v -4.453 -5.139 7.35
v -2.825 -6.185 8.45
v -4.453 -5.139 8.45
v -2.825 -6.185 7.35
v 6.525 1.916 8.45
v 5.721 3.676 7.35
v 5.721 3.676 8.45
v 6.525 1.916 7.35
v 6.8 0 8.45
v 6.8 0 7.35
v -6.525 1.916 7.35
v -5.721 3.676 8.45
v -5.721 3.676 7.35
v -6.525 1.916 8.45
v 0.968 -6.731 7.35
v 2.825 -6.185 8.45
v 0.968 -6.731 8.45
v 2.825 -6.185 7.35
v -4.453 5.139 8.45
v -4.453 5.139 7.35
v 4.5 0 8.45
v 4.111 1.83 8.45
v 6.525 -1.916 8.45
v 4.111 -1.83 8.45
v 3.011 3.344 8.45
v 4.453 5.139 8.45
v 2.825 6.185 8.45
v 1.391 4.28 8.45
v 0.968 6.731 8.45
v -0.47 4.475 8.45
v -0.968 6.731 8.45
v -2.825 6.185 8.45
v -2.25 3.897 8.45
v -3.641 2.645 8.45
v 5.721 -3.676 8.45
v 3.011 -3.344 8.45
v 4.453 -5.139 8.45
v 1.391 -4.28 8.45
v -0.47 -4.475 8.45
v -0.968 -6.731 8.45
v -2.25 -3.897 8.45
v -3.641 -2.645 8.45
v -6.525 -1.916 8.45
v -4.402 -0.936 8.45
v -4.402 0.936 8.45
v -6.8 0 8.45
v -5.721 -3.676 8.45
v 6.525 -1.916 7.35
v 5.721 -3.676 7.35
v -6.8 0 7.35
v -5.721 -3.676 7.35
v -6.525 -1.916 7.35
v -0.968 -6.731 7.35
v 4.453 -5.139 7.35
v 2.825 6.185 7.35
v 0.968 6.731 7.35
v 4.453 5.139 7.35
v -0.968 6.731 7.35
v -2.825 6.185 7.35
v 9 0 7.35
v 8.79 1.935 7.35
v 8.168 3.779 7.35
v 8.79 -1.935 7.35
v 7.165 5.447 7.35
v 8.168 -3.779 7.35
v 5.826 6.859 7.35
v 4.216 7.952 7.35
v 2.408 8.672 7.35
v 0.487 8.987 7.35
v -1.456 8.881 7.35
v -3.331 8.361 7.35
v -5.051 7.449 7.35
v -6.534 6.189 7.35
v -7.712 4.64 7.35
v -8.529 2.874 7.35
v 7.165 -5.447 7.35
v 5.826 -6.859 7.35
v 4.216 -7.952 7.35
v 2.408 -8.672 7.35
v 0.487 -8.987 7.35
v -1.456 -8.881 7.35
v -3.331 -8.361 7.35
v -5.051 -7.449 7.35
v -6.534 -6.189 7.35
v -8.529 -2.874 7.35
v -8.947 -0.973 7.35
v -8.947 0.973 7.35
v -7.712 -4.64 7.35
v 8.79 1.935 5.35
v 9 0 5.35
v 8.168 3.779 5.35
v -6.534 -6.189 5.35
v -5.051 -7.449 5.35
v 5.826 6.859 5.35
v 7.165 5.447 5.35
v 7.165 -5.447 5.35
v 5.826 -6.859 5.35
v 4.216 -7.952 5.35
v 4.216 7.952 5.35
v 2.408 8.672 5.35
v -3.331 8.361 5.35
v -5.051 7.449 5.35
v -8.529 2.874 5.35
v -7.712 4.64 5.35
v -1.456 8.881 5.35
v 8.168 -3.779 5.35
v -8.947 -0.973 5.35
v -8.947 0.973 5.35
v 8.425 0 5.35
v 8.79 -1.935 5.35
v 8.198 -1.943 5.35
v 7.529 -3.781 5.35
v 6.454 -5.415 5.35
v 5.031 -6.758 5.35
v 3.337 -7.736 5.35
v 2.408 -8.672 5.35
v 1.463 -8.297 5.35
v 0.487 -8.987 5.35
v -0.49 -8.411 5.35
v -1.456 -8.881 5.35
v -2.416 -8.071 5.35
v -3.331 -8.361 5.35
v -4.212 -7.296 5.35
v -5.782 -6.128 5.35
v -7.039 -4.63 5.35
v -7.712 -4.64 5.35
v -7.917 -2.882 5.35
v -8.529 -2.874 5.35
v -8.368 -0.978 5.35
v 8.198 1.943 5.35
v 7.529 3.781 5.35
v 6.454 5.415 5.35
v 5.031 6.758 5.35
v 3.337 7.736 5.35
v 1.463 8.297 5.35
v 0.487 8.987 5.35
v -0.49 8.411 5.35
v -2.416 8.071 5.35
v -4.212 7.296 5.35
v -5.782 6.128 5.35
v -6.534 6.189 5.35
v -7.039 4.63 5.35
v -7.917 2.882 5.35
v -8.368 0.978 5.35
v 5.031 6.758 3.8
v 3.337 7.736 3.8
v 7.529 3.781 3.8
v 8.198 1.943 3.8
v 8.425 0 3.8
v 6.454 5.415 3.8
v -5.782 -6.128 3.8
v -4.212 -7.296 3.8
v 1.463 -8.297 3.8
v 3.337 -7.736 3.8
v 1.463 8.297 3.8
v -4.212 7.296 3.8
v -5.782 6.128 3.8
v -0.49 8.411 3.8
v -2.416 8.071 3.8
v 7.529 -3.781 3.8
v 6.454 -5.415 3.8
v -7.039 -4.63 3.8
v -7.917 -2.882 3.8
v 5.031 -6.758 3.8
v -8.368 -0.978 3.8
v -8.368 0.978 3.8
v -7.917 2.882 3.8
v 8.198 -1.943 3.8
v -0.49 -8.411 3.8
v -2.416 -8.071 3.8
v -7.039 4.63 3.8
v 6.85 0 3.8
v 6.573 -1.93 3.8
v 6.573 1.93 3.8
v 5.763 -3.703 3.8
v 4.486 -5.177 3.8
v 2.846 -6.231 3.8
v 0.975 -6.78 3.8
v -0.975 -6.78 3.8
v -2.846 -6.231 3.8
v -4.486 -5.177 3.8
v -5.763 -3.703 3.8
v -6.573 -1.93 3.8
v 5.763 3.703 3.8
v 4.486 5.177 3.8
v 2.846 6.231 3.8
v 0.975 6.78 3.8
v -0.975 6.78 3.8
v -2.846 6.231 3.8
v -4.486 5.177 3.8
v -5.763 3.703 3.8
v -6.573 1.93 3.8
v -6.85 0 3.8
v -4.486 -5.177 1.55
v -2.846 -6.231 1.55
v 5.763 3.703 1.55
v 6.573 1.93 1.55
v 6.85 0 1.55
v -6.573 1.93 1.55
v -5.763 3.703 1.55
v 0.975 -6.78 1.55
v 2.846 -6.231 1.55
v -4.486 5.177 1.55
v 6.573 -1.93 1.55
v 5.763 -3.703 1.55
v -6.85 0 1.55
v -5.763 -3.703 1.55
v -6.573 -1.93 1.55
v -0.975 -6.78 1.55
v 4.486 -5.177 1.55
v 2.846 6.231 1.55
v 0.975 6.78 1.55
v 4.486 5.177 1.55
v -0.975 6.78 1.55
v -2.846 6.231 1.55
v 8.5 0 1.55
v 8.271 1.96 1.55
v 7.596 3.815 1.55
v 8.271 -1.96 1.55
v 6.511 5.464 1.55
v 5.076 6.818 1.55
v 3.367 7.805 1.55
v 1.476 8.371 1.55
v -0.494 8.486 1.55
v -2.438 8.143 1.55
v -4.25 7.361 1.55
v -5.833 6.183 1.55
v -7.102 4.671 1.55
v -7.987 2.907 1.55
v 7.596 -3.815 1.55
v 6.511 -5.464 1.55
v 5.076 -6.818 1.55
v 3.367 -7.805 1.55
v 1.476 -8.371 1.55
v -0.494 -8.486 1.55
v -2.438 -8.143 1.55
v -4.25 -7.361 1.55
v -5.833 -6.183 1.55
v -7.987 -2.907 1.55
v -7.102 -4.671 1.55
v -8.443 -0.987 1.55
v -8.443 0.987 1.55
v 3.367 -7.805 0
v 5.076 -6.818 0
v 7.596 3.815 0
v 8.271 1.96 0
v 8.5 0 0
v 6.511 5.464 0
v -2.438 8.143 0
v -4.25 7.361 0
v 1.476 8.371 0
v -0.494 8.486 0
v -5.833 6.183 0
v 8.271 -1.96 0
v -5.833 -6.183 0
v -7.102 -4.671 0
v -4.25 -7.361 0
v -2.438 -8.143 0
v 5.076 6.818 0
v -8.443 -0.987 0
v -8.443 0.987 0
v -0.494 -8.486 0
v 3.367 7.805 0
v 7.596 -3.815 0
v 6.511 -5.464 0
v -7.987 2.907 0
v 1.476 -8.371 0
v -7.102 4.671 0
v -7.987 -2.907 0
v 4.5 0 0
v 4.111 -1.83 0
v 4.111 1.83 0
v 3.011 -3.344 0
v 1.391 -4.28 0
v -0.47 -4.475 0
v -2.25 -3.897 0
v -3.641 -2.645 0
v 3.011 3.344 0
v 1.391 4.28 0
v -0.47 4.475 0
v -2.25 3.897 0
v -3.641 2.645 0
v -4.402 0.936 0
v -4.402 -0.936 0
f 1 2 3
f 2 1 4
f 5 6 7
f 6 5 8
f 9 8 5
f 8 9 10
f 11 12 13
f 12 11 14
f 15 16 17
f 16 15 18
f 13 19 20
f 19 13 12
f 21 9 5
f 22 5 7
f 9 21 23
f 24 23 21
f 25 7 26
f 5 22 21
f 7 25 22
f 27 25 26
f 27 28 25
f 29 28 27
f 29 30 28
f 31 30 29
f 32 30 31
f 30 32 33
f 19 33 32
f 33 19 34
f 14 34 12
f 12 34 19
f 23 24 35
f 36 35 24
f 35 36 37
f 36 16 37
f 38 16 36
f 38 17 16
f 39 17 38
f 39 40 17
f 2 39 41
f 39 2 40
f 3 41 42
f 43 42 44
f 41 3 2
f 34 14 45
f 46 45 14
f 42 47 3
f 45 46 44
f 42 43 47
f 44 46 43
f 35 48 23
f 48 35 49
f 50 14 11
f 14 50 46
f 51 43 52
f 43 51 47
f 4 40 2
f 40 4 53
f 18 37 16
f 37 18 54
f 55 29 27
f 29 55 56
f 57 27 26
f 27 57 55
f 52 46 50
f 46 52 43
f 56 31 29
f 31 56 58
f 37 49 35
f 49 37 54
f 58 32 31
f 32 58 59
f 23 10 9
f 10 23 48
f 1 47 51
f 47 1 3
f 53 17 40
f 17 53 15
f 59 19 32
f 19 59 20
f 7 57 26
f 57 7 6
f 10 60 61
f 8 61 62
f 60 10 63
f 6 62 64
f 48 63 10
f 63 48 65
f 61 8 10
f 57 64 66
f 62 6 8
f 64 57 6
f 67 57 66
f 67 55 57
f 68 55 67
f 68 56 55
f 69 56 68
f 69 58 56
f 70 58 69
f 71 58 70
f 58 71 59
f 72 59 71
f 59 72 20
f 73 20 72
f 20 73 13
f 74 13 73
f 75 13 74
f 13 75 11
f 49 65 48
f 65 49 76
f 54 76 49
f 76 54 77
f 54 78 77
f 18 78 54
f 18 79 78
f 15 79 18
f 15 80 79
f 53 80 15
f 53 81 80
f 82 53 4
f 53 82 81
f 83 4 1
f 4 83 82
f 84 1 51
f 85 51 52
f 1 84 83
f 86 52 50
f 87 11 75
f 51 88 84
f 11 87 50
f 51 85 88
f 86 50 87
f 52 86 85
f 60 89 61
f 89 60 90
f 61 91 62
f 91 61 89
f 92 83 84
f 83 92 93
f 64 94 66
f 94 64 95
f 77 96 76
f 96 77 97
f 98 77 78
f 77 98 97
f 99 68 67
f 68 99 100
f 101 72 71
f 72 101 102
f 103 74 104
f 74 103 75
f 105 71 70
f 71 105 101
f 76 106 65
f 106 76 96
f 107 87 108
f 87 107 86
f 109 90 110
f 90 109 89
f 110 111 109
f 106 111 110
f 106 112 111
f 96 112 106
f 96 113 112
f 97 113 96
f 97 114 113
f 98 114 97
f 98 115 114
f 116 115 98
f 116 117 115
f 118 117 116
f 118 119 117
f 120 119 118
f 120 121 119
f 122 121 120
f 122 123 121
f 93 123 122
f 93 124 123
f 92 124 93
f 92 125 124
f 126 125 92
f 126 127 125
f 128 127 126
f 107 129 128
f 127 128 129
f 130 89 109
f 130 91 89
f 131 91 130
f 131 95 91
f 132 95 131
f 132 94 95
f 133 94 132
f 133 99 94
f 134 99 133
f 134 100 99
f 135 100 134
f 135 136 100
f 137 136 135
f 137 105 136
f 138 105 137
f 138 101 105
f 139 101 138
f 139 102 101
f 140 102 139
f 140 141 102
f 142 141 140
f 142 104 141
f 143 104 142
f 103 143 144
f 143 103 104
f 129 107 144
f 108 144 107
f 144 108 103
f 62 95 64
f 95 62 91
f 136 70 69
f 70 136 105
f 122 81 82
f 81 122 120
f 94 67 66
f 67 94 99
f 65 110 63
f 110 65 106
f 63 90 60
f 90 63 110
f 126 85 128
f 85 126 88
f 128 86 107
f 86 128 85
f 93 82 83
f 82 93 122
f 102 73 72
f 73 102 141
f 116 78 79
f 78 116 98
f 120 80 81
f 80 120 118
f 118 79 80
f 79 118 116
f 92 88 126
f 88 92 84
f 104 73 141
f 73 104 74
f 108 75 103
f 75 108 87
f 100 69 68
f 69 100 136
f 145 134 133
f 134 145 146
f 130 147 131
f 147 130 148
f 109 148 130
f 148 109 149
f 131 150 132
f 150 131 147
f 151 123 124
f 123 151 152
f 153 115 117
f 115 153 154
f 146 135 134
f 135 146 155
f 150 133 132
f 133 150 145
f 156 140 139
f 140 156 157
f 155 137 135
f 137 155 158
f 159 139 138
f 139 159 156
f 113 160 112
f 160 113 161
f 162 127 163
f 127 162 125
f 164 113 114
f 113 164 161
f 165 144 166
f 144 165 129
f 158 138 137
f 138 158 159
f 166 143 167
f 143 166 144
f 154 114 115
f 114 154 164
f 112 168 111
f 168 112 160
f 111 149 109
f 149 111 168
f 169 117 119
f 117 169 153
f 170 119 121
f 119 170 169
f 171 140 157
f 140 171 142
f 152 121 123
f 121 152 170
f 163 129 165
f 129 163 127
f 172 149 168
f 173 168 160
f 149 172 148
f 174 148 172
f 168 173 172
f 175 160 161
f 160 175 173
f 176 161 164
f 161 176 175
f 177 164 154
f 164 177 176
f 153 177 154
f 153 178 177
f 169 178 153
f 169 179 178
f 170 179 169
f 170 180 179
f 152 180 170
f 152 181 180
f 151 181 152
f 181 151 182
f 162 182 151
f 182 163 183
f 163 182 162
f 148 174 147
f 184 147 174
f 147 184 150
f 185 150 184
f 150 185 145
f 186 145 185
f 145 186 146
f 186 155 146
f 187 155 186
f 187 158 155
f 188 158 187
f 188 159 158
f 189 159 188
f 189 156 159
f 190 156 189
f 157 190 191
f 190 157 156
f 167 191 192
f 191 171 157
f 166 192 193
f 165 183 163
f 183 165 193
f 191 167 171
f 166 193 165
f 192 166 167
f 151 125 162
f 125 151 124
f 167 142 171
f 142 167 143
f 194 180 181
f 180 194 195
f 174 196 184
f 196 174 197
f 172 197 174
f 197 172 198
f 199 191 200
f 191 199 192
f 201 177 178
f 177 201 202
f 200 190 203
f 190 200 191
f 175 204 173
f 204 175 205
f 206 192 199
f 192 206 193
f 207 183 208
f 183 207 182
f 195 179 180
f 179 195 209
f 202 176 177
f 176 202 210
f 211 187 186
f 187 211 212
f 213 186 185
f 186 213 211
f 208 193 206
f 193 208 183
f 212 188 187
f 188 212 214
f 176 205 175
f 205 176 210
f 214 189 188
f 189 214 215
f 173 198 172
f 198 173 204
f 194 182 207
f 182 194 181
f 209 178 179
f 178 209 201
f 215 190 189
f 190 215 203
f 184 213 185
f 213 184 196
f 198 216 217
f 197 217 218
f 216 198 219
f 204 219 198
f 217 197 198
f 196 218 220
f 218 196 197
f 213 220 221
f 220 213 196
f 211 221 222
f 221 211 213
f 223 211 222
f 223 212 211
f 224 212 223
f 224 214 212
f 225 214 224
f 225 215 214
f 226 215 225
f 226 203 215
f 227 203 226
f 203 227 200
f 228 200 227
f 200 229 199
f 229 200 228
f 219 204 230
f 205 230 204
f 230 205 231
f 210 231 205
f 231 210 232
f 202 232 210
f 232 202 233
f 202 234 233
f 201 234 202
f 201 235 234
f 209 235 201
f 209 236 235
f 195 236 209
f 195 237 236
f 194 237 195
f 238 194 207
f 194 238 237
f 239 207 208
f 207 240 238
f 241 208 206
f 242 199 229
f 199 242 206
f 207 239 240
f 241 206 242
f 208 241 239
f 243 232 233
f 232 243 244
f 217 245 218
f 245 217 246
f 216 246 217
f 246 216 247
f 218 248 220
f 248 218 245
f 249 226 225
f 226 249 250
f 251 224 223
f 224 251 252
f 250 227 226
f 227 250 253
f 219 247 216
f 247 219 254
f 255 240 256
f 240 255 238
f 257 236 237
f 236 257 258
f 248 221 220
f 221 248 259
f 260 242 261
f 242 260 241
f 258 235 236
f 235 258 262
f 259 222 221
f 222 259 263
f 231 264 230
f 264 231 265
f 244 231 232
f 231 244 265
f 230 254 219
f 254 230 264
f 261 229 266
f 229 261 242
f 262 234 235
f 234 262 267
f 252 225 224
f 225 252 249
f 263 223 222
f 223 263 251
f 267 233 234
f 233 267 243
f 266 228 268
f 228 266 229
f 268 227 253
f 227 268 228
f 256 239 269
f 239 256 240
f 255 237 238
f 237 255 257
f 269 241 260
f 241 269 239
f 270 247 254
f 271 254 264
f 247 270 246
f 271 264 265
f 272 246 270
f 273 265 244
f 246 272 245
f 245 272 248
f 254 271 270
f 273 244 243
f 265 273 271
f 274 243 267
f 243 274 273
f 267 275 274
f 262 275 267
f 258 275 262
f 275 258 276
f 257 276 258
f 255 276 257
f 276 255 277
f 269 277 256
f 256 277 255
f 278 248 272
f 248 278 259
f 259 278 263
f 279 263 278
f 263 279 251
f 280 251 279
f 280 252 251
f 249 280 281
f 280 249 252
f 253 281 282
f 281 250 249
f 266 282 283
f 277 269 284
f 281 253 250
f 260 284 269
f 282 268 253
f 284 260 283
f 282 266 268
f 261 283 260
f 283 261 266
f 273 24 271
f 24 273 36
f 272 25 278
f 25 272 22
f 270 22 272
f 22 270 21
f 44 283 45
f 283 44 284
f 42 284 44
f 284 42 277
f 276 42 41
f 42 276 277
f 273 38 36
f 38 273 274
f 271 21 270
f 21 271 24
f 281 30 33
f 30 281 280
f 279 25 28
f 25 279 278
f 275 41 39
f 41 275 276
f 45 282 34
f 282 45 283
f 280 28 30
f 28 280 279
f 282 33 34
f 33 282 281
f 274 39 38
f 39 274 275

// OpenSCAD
// from top to bottom
h_total = 8.45;
d_innen = 9;

d5 = 13.6; d4 = 18;  d3 = 16.85;  d2 = 13.7;  d1 = 17.0;  
h5 = 1.1;  h4 = 2;   h3 = 1.55;   h2 = 2.25;  h1 = 1.55;     

t5 = h1+h2+h3+h4;
t4 = h1+h2+h3;
t3 = h1+h2;
t2 = h1;
t1 = 0;

module union(){
    translate([0,0,t5]) cylinder(h=h5, r=d5/2); 
    translate([0,0,t4]) cylinder(h=h4, r=d4/2); 
    translate([0,0,t3]) cylinder(h=h3, r=d3/2); 
    translate([0,0,t2]) cylinder(h=h2, r=d2/2); 
    translate([0,0,t1]) cylinder(h=h1, r=d1/2); 
}

difference(){
    union();
    
    translate([0,0,-0.1])
    cylinder(h=h_total+0.2,  r=d_innen/2);
}
